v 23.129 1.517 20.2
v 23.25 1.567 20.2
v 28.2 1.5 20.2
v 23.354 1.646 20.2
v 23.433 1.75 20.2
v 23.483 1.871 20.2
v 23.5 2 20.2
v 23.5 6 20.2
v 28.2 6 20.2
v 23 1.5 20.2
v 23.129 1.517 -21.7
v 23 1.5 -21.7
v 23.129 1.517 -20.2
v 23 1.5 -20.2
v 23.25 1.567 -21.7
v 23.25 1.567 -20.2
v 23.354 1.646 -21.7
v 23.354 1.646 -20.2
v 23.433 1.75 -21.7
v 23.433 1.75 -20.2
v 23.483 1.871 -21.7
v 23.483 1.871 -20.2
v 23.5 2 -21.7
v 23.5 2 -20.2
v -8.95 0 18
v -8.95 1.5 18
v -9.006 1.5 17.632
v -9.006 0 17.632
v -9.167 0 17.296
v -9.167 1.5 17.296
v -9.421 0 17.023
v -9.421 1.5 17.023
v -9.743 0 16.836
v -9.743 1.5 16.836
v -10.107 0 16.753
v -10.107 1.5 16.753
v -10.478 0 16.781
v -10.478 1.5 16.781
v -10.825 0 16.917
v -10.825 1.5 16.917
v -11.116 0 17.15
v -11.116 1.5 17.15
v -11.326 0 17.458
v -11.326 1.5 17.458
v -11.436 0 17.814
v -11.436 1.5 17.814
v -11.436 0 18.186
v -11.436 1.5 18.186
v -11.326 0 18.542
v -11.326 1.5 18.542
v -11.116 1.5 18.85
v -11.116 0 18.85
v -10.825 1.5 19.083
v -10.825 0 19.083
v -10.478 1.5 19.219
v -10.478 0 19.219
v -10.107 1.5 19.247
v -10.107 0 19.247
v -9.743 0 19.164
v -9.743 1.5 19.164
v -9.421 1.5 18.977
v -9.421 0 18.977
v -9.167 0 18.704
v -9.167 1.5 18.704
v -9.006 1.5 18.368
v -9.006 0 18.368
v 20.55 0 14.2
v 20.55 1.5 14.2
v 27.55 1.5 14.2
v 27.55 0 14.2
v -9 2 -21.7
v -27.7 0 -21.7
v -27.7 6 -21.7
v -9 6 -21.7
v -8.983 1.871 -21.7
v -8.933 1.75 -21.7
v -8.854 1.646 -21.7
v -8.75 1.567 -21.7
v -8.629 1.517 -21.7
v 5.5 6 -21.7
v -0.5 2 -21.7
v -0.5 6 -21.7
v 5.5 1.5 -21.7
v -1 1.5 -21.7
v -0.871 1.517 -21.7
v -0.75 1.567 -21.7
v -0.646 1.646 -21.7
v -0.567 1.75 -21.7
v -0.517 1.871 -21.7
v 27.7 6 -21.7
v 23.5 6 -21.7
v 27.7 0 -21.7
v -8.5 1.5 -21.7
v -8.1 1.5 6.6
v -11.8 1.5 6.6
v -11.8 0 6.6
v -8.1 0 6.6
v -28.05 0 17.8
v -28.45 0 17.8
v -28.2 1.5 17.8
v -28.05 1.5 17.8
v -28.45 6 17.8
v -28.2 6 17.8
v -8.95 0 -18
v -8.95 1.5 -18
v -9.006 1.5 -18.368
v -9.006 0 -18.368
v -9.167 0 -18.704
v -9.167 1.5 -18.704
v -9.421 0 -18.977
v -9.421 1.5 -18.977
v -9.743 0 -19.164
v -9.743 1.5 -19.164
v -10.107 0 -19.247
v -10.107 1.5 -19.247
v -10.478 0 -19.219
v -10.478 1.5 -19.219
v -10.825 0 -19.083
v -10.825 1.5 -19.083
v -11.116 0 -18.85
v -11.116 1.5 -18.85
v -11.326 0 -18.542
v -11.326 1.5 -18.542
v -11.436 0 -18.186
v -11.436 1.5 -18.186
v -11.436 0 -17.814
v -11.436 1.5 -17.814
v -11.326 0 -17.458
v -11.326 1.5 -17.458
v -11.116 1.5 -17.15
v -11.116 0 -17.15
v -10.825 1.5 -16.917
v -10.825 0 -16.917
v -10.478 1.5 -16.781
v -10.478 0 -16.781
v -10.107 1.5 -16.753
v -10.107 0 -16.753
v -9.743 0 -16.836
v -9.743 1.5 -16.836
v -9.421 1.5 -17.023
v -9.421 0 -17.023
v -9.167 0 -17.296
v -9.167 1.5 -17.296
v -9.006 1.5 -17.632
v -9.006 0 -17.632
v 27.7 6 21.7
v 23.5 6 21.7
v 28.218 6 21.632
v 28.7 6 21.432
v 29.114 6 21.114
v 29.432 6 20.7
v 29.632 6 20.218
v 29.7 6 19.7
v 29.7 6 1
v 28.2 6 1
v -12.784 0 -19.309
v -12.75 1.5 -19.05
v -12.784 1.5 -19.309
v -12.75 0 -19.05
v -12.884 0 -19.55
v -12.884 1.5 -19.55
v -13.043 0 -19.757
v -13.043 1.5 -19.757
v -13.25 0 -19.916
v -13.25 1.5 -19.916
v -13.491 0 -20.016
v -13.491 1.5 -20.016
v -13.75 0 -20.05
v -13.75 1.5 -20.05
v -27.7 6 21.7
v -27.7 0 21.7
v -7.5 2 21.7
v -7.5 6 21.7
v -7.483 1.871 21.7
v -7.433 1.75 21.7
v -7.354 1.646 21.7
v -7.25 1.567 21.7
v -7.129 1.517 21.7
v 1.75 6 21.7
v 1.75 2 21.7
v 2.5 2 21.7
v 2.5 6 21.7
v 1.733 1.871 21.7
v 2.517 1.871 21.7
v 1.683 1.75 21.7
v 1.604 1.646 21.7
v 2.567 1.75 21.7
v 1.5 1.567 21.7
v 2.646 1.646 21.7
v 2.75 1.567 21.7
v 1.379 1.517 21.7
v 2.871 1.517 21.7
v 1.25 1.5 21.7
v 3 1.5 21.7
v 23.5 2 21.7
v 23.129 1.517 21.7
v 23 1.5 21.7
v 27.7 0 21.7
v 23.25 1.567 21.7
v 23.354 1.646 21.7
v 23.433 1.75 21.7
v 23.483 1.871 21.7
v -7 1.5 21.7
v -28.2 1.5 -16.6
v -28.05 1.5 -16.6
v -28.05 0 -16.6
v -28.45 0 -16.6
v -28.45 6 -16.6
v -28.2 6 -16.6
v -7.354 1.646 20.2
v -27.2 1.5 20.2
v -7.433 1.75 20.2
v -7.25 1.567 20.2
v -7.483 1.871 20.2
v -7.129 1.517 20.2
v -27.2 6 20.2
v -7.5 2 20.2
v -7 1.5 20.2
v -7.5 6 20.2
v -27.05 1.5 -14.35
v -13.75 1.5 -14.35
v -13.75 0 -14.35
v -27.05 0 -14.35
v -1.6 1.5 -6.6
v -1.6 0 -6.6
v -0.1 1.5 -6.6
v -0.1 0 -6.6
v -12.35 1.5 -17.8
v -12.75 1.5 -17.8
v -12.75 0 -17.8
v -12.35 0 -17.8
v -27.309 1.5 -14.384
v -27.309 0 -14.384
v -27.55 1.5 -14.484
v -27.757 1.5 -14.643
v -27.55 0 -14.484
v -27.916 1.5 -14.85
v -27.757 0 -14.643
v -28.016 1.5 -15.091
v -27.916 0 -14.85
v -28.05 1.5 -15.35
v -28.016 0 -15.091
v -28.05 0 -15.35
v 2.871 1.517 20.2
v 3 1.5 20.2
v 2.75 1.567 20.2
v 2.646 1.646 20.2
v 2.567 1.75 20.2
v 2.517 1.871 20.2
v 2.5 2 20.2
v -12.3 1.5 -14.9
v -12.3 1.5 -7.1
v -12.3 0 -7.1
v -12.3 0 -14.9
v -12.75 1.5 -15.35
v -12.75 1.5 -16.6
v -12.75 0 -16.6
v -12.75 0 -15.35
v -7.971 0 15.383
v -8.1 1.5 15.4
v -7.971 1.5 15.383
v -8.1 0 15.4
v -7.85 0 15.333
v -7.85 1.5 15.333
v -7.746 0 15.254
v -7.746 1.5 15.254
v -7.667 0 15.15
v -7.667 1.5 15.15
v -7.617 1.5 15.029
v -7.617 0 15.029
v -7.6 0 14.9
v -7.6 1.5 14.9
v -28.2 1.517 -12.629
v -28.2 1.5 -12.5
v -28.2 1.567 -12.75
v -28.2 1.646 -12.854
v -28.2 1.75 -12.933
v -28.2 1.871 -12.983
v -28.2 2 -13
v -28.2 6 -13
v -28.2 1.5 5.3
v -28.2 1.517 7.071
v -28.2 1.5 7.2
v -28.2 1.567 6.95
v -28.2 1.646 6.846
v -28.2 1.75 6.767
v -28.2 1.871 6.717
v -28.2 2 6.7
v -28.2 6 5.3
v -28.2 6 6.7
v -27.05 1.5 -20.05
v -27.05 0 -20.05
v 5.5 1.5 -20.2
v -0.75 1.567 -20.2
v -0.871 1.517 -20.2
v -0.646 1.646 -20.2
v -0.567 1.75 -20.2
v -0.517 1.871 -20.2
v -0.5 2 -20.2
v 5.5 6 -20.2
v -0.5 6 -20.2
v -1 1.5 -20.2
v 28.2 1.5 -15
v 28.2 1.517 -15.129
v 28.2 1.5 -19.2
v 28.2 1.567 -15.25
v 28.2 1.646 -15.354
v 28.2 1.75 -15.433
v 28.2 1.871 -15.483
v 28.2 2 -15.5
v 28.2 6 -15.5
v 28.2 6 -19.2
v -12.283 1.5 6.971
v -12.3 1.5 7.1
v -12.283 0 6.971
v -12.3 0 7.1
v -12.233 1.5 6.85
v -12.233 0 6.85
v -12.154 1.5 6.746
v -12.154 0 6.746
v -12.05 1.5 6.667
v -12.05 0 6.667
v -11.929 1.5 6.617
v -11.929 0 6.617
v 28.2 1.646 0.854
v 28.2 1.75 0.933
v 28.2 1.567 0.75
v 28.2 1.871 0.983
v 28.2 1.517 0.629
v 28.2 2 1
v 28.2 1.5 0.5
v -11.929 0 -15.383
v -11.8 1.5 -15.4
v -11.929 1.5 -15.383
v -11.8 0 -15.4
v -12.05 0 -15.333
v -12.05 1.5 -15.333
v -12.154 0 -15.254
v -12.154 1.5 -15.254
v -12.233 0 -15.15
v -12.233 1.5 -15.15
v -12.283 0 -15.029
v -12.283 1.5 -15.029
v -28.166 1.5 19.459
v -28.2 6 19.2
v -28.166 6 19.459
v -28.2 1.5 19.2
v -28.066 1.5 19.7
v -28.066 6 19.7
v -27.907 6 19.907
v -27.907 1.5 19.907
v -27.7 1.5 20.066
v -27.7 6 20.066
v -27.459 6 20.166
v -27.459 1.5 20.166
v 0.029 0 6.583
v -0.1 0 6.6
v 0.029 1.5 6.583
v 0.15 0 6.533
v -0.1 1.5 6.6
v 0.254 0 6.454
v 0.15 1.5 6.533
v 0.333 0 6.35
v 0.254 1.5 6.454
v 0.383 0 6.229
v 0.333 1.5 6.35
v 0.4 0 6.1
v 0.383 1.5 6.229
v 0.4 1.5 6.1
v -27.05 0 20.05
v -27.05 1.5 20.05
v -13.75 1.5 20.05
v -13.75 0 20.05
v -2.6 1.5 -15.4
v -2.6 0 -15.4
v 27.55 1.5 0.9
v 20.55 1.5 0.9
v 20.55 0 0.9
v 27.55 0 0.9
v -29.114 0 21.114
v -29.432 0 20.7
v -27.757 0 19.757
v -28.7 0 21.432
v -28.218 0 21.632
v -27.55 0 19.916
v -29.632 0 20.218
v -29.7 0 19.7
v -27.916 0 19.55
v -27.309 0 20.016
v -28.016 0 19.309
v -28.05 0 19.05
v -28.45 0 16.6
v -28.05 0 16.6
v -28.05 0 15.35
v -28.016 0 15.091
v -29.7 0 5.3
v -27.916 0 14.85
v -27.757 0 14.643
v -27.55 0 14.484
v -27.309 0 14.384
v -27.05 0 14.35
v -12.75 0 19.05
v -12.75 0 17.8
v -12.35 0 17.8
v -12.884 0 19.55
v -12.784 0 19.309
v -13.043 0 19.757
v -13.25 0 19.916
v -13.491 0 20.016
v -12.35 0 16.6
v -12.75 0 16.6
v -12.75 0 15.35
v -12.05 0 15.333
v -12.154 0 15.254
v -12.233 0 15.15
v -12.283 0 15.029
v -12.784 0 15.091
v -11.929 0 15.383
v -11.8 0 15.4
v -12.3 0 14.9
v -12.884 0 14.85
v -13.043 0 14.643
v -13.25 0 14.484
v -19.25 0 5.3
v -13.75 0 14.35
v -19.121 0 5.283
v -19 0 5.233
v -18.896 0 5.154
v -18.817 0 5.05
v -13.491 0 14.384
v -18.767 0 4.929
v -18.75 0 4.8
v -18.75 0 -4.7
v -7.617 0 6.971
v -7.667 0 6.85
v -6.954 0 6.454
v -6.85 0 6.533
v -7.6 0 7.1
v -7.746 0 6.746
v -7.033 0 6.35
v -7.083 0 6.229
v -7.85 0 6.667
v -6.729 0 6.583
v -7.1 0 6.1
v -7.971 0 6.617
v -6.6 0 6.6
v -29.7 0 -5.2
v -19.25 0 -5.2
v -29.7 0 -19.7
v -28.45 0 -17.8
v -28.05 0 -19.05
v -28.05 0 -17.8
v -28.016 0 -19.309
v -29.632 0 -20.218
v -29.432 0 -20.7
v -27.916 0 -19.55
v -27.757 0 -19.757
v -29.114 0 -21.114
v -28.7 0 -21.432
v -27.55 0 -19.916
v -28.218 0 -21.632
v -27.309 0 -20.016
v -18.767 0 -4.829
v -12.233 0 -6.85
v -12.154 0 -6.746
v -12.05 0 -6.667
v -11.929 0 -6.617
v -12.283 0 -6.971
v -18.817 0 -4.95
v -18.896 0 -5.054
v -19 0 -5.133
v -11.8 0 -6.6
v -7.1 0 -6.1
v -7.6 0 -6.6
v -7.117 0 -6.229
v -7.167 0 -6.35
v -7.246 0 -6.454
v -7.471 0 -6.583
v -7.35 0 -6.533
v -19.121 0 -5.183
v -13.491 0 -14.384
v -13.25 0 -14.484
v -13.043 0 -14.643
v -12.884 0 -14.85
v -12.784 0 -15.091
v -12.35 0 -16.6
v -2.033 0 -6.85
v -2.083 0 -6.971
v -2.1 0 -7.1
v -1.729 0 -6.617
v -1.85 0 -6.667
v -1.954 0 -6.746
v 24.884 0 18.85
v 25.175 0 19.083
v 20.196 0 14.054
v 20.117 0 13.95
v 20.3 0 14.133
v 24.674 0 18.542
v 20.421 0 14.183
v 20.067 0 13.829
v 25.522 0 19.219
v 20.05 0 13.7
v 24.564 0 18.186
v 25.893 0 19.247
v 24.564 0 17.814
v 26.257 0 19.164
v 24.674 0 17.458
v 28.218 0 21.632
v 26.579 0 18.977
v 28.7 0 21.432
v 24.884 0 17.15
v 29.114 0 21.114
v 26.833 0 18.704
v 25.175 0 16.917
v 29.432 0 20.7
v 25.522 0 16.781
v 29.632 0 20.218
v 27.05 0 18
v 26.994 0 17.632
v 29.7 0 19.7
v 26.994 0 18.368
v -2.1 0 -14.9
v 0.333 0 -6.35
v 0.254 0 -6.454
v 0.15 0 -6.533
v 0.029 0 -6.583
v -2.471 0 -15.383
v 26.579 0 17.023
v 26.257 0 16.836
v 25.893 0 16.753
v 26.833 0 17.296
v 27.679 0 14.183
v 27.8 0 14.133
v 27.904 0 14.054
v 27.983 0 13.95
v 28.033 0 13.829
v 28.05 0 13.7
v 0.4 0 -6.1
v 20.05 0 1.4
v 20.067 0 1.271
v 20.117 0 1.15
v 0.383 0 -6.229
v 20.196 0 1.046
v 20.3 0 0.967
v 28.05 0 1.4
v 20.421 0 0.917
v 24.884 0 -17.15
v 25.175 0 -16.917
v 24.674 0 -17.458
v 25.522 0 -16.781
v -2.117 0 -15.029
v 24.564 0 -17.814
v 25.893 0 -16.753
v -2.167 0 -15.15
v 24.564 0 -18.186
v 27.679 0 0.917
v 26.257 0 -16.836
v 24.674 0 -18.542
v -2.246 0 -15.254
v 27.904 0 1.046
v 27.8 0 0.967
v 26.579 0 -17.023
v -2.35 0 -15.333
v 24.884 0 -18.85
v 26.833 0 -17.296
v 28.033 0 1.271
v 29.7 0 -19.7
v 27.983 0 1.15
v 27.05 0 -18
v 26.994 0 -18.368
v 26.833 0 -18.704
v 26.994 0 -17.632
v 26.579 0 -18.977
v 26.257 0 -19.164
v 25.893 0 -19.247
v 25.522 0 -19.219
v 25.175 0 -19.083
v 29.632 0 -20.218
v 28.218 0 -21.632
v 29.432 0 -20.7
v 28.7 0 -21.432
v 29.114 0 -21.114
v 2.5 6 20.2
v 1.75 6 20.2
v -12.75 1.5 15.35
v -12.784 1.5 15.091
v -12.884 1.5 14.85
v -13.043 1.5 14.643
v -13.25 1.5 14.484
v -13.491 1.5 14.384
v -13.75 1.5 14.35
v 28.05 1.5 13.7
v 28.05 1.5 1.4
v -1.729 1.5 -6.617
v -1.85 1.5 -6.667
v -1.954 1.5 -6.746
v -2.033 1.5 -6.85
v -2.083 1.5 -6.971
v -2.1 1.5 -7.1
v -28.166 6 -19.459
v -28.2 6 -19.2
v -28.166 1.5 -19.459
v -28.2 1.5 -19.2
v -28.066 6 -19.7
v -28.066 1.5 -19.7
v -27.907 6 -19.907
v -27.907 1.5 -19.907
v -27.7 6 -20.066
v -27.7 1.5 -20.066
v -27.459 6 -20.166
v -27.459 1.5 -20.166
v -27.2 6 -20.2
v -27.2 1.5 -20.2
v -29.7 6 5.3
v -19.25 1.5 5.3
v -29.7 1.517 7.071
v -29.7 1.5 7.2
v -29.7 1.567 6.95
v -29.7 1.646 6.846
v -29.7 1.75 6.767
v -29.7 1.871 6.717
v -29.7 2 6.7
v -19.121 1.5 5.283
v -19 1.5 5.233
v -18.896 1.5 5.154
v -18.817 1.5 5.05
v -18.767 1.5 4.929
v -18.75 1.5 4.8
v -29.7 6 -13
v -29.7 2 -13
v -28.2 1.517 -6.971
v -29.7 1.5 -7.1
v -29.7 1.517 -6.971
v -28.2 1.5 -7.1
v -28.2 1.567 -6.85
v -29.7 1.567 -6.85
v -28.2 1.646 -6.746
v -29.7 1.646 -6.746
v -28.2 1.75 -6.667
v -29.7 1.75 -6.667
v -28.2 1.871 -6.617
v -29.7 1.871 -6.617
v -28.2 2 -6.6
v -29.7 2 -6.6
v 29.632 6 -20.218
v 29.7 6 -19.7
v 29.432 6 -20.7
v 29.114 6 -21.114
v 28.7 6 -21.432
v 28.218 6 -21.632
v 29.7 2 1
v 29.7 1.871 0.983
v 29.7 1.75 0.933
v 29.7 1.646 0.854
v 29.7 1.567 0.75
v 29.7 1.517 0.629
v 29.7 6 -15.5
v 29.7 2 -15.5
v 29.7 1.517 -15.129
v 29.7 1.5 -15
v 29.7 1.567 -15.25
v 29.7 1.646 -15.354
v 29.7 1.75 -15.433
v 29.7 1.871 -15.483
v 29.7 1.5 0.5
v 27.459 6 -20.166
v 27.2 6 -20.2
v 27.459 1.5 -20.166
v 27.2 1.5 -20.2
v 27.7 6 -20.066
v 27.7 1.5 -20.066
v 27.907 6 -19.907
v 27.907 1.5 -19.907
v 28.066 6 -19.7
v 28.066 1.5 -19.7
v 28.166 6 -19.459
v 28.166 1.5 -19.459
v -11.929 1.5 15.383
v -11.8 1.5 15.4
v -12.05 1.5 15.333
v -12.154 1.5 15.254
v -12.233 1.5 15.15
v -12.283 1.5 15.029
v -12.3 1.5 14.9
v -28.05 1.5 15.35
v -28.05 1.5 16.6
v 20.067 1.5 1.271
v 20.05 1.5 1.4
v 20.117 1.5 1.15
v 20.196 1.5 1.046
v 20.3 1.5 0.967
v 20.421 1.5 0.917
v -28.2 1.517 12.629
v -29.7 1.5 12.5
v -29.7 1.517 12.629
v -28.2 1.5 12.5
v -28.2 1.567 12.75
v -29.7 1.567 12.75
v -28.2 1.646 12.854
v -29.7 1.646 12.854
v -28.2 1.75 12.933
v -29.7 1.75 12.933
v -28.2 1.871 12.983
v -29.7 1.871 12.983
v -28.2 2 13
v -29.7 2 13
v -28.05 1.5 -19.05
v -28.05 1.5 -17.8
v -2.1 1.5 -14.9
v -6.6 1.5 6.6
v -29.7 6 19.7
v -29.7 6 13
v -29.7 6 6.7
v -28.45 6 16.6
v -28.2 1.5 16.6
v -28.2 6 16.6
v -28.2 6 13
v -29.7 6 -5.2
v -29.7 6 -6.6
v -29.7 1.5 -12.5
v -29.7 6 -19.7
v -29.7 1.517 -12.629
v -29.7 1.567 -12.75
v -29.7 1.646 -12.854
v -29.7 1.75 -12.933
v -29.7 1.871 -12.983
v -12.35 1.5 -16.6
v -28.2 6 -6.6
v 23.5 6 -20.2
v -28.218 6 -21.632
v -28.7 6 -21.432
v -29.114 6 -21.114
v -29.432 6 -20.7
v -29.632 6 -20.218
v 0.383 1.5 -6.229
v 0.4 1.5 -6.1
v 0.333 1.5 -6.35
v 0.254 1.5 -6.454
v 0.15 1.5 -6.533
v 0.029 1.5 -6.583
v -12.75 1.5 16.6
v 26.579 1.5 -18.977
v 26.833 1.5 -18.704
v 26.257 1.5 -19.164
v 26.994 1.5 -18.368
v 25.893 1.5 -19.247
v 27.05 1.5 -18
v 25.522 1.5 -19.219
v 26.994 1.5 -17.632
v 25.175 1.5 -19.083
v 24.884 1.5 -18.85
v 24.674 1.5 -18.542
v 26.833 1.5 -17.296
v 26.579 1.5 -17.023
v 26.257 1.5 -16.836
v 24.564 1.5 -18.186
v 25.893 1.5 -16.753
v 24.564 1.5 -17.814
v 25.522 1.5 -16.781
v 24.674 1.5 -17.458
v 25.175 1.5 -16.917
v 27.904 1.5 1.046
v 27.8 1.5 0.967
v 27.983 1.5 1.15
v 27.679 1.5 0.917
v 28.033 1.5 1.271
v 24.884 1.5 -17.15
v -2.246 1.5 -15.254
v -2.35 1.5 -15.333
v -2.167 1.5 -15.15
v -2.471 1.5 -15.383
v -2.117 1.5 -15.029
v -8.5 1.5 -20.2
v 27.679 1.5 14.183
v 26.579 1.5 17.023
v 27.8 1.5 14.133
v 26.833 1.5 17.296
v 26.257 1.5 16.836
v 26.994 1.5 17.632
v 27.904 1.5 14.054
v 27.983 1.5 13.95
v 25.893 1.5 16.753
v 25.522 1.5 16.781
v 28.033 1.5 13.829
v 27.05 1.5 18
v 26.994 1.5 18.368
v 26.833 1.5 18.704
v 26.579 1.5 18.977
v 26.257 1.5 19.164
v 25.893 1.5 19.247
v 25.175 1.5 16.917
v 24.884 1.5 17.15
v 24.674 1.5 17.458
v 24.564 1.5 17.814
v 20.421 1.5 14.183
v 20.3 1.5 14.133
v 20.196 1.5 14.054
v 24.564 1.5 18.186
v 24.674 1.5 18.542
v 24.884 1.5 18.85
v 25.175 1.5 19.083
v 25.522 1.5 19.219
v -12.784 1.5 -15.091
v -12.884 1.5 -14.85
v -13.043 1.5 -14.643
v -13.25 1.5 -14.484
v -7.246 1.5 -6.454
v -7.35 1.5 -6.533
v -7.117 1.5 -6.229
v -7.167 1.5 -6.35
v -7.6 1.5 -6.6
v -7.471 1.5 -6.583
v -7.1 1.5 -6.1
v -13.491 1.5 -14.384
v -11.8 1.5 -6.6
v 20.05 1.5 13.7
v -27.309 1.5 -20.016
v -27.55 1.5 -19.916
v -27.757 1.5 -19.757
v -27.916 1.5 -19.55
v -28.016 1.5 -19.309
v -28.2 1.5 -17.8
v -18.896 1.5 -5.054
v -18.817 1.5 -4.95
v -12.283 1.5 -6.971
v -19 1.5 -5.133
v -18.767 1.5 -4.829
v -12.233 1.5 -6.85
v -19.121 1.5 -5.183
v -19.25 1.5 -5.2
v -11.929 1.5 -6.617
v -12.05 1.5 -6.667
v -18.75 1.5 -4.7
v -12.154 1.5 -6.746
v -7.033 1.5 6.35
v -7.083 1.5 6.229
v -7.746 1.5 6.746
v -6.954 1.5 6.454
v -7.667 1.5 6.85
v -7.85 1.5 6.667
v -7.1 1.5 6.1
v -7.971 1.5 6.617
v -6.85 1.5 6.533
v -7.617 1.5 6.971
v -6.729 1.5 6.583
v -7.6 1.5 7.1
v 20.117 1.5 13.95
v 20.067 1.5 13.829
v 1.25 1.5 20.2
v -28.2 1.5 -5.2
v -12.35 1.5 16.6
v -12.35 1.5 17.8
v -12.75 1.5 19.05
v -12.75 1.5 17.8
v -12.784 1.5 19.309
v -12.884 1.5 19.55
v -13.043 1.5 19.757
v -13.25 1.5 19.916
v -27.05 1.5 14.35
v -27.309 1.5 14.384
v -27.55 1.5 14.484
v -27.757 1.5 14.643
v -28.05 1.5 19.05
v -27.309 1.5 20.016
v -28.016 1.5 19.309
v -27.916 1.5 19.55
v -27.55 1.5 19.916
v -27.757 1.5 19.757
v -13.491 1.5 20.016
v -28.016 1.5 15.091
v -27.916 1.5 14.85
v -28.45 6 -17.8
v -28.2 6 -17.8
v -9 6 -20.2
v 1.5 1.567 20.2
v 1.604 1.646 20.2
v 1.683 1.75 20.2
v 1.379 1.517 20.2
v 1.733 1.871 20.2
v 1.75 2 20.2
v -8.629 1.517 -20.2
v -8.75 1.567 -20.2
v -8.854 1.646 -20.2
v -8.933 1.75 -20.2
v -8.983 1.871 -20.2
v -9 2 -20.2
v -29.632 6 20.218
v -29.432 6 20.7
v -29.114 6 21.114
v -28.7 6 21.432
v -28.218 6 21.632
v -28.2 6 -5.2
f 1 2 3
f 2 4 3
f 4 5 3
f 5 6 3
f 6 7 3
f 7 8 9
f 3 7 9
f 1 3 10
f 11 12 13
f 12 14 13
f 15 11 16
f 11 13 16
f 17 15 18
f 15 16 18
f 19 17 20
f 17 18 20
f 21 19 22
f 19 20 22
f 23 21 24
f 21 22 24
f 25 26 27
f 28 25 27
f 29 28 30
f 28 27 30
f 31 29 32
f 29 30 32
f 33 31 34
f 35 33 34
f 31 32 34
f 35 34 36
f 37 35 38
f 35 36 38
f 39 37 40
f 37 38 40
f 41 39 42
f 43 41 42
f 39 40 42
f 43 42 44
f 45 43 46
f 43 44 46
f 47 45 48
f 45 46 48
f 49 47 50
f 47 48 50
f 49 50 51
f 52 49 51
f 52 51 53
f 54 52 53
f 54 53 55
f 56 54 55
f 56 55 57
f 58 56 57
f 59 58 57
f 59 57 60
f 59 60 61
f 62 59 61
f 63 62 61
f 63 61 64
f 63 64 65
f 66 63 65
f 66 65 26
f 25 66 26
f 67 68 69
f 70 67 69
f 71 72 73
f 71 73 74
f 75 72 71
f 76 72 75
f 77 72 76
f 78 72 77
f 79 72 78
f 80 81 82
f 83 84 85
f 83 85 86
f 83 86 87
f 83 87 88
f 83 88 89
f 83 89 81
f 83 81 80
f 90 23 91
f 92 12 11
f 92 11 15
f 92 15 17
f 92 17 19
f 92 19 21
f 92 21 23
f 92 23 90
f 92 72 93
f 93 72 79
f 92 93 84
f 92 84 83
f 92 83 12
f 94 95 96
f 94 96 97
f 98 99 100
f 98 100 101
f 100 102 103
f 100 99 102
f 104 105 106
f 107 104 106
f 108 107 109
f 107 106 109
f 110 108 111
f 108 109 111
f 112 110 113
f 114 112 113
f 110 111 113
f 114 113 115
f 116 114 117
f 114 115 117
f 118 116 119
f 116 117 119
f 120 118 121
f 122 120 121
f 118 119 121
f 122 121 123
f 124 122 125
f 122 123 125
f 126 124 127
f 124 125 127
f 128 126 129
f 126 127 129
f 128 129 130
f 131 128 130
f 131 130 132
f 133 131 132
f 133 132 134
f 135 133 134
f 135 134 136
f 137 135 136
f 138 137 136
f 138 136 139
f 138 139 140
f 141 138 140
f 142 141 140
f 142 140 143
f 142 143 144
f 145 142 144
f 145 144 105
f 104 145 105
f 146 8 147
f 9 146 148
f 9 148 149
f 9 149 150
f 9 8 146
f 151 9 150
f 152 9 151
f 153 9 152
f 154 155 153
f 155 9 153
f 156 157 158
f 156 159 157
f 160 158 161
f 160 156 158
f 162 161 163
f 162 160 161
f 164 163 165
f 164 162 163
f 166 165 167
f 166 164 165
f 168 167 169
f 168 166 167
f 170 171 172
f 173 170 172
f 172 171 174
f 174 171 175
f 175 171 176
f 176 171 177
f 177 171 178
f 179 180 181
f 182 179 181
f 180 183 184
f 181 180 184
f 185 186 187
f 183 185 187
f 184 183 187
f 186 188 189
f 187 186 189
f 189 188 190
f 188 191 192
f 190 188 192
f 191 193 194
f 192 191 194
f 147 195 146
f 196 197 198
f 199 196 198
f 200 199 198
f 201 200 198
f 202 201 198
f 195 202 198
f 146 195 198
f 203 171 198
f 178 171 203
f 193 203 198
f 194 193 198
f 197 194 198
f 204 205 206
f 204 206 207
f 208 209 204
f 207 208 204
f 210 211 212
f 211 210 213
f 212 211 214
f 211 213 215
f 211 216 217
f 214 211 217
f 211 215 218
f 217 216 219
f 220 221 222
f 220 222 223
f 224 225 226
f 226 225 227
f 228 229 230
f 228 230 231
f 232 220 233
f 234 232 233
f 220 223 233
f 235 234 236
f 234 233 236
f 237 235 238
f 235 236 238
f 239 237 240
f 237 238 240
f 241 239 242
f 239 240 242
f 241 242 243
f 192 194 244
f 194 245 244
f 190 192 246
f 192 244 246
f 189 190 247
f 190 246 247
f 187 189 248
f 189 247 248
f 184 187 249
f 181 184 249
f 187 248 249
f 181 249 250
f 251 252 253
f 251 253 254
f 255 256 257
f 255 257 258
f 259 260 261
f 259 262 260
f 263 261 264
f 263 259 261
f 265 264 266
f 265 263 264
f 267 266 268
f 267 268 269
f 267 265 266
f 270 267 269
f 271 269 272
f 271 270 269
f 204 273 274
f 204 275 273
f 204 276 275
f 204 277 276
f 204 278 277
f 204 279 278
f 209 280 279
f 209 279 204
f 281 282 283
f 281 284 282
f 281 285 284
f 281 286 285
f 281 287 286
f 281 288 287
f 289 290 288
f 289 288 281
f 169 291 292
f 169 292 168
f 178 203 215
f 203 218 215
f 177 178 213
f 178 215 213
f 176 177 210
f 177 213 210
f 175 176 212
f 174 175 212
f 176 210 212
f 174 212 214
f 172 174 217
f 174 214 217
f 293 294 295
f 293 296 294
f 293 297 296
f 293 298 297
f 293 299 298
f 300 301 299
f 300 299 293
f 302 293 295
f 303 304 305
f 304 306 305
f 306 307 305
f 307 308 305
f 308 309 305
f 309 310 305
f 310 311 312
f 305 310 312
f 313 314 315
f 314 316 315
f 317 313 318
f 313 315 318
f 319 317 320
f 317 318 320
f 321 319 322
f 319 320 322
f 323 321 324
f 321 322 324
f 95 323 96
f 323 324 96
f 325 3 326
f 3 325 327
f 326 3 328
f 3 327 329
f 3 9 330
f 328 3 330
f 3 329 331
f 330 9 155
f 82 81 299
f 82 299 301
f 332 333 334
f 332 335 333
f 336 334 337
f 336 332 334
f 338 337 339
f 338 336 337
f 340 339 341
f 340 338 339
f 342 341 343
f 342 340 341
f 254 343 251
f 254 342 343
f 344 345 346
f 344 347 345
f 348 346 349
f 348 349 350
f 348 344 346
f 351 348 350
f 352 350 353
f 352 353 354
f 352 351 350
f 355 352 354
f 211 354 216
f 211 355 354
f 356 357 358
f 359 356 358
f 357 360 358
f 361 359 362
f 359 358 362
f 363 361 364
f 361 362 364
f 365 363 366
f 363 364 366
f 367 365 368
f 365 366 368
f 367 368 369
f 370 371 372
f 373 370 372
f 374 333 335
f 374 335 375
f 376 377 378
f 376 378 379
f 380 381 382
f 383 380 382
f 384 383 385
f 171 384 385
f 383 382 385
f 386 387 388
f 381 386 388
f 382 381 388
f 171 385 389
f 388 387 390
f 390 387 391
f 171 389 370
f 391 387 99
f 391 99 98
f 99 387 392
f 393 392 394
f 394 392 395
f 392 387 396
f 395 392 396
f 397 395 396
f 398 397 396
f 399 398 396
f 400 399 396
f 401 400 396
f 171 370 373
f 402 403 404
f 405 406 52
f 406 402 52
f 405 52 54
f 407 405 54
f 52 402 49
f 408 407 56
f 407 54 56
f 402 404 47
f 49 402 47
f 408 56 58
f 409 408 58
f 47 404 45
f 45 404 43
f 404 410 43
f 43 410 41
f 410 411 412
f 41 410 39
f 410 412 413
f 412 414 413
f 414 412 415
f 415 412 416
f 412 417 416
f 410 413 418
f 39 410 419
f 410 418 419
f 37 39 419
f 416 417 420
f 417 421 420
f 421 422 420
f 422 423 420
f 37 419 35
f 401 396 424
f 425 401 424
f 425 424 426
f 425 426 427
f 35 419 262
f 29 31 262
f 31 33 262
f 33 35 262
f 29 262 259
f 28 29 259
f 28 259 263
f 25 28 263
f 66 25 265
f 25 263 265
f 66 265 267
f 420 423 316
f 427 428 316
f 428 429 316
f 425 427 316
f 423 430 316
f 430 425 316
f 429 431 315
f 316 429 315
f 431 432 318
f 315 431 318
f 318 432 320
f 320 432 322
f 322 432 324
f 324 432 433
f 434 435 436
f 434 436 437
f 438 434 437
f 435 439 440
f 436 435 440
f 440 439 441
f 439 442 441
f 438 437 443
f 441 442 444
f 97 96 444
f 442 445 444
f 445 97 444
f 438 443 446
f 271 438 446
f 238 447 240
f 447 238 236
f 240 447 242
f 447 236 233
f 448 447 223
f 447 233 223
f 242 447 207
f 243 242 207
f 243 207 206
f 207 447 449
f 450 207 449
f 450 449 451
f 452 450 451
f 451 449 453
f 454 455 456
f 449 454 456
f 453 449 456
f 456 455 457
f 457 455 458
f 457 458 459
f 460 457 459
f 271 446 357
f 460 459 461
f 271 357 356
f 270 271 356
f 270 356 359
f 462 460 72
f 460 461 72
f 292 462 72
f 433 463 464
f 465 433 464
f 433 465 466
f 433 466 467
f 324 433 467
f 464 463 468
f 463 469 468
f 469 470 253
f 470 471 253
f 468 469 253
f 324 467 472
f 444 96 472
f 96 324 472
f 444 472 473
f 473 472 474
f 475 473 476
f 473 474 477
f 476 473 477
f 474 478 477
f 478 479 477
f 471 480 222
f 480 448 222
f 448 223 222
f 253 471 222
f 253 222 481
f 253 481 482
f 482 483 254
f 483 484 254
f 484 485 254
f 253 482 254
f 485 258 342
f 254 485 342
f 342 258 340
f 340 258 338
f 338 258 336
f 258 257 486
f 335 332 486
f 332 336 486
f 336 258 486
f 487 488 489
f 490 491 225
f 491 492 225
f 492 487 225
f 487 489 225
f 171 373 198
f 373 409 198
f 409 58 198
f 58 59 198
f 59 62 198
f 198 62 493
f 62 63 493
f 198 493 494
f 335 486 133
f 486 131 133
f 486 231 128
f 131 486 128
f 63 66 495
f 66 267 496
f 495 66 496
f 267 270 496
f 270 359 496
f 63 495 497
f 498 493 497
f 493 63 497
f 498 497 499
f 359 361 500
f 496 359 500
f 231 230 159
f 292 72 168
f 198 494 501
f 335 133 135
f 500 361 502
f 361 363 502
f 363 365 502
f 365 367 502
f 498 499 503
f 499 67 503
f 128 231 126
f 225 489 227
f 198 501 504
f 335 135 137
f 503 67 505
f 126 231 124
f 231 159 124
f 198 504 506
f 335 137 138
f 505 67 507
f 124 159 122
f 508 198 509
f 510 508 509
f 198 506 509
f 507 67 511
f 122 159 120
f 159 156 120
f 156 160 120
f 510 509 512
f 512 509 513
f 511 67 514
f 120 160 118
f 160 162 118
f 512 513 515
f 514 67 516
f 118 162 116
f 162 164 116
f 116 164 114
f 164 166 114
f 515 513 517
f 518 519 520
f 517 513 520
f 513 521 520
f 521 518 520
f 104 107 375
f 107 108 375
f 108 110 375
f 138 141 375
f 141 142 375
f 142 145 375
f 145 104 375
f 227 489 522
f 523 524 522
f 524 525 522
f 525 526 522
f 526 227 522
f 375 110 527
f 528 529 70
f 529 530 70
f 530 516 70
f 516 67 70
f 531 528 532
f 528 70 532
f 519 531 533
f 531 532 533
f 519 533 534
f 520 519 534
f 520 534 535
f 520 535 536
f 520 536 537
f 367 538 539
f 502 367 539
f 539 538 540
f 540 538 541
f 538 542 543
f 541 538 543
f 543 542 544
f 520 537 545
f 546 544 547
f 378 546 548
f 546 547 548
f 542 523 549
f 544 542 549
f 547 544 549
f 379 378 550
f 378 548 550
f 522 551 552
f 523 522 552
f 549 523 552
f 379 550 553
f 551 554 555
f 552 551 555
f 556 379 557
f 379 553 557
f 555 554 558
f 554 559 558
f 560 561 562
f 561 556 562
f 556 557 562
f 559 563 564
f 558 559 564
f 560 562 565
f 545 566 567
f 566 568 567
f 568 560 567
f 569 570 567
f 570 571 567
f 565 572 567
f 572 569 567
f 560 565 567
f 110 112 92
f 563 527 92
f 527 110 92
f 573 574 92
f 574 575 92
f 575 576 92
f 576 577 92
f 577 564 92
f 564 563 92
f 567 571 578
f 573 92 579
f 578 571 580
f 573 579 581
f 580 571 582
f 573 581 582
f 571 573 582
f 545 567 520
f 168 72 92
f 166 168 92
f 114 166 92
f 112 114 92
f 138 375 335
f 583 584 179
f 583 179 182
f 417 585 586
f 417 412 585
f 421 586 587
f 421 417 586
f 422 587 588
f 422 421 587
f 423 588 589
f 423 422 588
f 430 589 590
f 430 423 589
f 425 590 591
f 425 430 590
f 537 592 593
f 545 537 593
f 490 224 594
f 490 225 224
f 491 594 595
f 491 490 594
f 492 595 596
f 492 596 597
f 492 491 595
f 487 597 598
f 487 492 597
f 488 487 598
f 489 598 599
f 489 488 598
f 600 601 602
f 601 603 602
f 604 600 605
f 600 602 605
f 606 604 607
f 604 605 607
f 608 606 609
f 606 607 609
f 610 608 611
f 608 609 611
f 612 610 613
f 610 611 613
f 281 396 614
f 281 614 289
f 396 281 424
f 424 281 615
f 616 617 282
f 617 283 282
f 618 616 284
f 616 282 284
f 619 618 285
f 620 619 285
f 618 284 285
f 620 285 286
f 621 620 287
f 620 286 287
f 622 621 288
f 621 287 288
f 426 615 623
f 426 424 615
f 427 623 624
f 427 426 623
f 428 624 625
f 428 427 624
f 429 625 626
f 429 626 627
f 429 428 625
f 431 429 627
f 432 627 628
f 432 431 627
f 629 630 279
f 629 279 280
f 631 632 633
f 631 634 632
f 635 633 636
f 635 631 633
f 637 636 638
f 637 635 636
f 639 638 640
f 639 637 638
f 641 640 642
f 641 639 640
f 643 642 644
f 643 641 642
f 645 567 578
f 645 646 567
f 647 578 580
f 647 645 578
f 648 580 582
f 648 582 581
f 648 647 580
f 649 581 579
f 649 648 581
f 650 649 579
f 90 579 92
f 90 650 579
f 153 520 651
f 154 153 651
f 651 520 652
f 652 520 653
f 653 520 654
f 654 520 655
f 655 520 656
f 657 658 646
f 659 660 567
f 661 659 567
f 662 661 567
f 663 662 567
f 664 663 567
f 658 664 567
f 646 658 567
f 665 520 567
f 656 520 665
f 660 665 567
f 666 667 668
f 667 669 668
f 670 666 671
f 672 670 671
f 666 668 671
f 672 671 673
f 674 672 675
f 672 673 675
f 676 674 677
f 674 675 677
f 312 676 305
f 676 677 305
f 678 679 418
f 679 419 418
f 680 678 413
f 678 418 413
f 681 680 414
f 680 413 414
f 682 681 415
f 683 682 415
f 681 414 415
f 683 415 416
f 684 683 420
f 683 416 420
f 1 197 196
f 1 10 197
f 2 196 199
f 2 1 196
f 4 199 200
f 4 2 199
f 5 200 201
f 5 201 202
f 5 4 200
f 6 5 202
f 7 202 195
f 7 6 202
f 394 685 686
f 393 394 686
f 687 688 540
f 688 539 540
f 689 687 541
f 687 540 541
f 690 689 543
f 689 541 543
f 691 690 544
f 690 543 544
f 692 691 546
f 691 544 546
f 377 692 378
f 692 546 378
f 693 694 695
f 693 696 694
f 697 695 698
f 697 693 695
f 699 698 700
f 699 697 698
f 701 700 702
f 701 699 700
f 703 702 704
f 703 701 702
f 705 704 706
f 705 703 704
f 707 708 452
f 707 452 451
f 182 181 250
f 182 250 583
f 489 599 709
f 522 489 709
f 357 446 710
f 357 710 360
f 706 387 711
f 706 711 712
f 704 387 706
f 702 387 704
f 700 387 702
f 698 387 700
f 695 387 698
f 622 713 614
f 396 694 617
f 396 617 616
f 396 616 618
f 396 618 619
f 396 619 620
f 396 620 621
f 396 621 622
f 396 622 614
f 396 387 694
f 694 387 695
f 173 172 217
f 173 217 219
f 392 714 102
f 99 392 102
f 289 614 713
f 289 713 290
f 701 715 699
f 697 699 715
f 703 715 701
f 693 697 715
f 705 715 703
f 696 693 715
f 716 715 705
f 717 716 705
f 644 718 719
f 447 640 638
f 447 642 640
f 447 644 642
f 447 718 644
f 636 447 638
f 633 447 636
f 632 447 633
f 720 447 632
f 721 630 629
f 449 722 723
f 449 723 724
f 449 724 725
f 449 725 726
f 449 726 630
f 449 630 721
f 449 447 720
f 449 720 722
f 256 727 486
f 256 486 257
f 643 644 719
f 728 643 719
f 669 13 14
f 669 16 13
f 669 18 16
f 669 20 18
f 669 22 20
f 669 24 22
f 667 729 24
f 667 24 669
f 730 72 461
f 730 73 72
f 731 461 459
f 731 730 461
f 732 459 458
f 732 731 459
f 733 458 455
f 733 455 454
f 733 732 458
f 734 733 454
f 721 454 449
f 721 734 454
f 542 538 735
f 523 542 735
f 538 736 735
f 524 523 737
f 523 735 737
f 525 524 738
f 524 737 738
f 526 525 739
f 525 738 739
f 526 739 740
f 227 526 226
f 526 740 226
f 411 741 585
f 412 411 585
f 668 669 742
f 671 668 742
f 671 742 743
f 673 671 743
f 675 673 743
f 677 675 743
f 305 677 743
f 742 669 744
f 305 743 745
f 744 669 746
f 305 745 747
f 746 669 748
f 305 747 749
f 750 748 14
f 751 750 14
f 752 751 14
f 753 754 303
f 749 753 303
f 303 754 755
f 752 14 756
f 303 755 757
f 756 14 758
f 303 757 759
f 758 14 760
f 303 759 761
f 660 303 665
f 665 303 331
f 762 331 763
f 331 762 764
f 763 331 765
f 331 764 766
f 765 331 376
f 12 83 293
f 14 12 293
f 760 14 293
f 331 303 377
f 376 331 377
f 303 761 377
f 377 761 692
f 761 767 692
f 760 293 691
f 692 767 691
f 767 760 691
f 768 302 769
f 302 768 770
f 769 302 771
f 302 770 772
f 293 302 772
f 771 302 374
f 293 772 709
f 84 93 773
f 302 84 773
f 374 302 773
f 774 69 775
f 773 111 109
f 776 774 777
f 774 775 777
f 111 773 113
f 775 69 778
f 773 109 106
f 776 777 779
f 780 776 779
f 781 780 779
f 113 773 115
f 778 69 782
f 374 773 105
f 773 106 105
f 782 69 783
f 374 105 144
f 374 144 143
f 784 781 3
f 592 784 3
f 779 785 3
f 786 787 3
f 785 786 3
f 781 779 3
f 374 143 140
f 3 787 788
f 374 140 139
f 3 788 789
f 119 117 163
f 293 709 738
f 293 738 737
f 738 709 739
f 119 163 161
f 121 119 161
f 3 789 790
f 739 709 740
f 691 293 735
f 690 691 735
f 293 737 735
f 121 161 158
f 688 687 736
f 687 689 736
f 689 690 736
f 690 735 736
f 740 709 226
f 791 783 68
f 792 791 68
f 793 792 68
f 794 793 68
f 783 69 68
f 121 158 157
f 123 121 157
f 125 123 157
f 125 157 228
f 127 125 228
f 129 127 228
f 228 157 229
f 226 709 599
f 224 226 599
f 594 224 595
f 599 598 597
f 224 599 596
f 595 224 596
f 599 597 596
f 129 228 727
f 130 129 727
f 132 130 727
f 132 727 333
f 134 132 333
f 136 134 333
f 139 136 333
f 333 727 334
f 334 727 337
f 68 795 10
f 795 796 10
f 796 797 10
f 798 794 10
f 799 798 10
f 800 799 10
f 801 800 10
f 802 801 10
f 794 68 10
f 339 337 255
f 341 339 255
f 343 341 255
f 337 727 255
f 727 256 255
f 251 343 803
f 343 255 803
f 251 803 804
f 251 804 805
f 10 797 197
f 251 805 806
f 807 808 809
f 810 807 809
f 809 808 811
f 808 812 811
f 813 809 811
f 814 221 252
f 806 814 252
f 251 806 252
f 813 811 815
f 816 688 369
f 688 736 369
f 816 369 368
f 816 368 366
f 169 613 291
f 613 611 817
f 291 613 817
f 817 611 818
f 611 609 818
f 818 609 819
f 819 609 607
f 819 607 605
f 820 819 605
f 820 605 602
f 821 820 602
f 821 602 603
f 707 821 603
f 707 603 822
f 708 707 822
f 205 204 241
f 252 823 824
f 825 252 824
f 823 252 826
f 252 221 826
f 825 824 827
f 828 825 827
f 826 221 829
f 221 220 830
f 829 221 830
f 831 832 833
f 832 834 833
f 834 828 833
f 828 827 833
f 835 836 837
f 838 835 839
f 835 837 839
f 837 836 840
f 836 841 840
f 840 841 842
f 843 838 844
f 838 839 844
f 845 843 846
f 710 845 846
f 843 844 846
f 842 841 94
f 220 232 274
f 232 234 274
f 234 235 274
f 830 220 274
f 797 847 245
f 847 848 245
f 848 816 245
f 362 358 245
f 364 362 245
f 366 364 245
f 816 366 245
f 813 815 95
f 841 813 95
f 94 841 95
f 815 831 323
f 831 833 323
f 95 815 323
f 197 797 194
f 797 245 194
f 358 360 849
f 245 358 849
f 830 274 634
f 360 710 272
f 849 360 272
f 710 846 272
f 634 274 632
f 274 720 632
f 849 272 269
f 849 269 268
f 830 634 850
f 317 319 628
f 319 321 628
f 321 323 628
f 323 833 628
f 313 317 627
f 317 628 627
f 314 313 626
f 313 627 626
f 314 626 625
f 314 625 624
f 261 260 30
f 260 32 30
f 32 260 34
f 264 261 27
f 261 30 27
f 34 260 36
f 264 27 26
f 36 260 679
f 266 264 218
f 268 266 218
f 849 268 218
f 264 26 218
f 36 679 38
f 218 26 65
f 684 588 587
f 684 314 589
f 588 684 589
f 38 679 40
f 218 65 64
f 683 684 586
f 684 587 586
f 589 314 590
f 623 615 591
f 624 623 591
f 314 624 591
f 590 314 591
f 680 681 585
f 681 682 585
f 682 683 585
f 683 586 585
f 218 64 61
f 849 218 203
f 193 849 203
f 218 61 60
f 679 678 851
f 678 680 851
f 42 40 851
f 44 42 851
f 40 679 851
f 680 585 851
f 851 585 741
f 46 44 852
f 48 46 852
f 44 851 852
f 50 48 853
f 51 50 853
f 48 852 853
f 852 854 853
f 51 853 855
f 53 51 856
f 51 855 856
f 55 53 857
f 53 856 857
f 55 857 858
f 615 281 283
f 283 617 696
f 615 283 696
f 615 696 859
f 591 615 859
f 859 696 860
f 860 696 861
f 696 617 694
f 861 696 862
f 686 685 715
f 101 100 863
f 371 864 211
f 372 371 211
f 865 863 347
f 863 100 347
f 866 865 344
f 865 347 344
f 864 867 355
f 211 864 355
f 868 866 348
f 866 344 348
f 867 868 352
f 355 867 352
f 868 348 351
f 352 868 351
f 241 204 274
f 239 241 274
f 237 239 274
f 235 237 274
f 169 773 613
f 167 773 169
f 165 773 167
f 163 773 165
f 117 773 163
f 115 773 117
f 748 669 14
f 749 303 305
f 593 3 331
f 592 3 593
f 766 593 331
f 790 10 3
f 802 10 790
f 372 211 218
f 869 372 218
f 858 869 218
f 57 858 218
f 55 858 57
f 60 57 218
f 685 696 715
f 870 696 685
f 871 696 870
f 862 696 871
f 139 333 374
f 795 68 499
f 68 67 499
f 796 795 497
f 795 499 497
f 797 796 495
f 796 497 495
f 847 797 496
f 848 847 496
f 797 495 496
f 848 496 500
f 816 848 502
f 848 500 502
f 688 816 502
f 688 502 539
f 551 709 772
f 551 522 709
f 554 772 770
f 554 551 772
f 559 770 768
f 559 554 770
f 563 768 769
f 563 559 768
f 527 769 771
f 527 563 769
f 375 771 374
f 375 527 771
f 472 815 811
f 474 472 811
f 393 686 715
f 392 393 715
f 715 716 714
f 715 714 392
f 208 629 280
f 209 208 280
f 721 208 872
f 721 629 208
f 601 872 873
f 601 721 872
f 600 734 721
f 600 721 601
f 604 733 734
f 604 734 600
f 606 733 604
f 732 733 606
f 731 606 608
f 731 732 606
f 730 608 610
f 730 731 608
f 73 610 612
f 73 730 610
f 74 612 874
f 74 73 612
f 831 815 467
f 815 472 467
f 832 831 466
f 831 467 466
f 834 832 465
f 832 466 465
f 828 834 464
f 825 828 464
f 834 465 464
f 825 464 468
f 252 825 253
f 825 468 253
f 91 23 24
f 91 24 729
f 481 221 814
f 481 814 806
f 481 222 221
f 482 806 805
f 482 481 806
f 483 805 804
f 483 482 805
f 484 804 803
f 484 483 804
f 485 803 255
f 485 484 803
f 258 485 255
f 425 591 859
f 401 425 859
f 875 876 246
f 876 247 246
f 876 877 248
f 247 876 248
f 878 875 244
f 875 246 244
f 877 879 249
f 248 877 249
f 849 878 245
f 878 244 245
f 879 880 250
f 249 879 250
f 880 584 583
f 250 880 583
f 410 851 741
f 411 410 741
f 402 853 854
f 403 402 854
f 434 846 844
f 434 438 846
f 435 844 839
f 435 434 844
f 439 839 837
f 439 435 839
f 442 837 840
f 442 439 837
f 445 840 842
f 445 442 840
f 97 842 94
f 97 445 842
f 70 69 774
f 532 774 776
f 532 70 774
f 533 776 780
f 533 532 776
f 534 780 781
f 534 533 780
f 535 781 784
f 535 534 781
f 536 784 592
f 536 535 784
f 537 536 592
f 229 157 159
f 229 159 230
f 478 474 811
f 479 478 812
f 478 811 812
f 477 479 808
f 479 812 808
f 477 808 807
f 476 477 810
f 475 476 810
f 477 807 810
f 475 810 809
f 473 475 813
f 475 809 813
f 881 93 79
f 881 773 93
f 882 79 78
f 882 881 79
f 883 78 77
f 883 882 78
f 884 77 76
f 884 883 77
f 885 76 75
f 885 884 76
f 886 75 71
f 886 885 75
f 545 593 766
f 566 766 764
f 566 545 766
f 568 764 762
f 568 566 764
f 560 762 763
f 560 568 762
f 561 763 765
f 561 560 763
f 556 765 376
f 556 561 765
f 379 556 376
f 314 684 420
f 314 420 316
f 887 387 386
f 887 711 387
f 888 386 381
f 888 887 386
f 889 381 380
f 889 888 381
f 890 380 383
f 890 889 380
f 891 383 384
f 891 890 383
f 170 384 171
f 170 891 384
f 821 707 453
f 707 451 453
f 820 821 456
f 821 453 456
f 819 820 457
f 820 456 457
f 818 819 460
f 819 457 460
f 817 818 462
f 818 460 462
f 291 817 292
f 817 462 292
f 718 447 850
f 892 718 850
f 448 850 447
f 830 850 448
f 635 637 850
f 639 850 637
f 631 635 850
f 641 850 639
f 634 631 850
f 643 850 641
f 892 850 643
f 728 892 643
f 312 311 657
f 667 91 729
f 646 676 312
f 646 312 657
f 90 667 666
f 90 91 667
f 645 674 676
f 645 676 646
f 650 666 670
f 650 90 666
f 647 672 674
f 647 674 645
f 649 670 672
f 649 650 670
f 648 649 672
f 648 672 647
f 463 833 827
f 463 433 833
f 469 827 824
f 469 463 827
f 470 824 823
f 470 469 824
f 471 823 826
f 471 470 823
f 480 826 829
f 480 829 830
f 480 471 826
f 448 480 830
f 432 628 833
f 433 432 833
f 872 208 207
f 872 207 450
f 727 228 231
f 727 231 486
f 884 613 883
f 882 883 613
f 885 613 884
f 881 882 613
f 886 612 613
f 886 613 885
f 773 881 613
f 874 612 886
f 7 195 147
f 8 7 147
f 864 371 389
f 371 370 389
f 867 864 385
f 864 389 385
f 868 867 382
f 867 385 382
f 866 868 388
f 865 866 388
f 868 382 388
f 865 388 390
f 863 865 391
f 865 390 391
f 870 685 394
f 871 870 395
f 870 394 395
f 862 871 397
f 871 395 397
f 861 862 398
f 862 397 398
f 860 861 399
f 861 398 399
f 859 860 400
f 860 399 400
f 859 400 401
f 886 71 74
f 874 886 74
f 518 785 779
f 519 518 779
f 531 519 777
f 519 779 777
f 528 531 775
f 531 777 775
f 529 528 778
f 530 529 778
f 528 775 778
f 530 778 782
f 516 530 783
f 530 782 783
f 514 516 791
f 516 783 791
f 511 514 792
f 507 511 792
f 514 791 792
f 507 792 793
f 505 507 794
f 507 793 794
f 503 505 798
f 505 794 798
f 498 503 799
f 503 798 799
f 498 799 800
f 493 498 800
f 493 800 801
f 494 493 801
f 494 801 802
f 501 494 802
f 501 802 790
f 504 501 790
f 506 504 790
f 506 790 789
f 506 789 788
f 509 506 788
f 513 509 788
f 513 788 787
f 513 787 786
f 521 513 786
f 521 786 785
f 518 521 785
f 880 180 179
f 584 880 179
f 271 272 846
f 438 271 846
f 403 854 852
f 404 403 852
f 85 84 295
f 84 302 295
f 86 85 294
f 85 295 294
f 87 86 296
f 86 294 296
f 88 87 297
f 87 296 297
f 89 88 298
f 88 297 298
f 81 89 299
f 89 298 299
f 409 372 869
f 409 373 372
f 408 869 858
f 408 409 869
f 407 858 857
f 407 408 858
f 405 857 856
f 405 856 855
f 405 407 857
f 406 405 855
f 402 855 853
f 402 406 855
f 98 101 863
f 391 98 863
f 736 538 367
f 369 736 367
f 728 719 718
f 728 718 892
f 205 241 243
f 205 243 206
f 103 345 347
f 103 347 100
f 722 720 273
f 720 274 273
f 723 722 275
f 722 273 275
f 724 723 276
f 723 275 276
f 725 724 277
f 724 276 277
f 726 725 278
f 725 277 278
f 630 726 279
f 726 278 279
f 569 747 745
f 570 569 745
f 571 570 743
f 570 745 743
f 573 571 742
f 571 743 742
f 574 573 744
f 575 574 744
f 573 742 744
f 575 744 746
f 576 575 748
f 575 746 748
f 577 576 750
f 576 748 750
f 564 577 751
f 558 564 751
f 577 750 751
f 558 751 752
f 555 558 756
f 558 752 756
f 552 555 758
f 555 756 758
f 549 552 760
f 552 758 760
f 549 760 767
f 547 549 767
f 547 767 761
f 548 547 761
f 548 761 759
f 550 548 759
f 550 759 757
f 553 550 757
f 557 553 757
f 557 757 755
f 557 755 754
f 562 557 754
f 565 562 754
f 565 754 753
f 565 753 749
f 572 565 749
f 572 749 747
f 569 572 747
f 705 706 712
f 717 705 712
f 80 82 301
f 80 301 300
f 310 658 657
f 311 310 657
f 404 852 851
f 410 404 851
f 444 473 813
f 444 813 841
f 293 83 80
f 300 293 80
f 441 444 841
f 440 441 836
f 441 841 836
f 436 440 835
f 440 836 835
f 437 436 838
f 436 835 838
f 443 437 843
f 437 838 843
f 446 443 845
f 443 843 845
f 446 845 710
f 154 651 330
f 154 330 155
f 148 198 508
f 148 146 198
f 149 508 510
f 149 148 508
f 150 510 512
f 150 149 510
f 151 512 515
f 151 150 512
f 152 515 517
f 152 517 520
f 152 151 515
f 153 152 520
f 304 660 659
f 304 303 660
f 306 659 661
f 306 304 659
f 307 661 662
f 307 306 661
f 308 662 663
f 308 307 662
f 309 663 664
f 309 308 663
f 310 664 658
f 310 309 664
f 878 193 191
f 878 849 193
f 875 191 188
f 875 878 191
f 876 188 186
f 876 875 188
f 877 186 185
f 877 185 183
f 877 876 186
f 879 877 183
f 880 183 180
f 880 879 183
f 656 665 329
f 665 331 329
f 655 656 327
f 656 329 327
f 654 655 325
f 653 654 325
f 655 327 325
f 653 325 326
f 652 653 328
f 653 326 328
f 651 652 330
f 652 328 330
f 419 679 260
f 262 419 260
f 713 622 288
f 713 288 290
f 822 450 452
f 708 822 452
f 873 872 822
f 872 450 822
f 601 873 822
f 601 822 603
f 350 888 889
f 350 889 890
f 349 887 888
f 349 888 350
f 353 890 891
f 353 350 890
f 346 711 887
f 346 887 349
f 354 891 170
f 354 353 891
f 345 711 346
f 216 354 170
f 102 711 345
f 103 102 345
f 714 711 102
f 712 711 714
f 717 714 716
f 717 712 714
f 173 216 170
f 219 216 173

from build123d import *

# Parameters (mm, degrees)
SKETCH_1_W               = 59.4
SKETCH_1_H               = 43.4
EXTRUDE_1_DEPTH          = 6
SKETCH_2_W               = 56.4
SKETCH_2_H               = 40.4
CUT_EXTRUDE_1_DEPTH      = 4.5
SKETCH_3_R               = 1.25
CUT_EXTRUDE_2_DEPTH      = 2.5
SKETCH_4_W               = 10.95
SKETCH_4_H               = 10.5
CUT_EXTRUDE_3_DEPTH      = 5.5
CUT_EXTRUDE_3_DEPTH_BACK = 2.5
SKETCH_5_W               = 6.4
SKETCH_5_H               = 4.5
SKETCH_5_W_2             = 6.3
CUT_EXTRUDE_4_DEPTH      = 4.5
CUT_EXTRUDE_5_DEPTH      = 5.5
CUT_EXTRUDE_5_DEPTH_BACK = 2.5
SKETCH_9_W               = 10.2
SKETCH_9_H               = 8.8
SKETCH_9_W_2             = 4.7
CUT_EXTRUDE_6_DEPTH      = 5.5
CUT_EXTRUDE_6_DEPTH_BACK = 2.5
SKETCH_10_W              = 8
SKETCH_10_H              = 13.3
CUT_EXTRUDE_7_DEPTH      = 5.5
CUT_EXTRUDE_7_DEPTH_BACK = 2.5
FILLET_1_R               = 2
SKETCH_11_W              = 8.5
SKETCH_11_H              = 4.5
SKETCH_11_W_2            = 18
CUT_EXTRUDE_8_DEPTH      = 3
SKETCH_12_W              = 9.25
SKETCH_12_H              = 4.5
SKETCH_12_W_2            = 21
CUT_EXTRUDE_9_DEPTH      = 3
SKETCH_13_W              = 16.5
SKETCH_13_H              = 4.5
CUT_EXTRUDE_10_DEPTH     = 3
SKETCH_14_W              = 7.5
SKETCH_14_H              = 13.2
CUT_EXTRUDE_11_DEPTH     = 10
FILLET_2_R               = 0.5
FILLET_3_R               = 1
FILLET_4_R               = 0.5


with BuildPart() as part:
    # 草图1 → 凸台-拉伸1 (new body)
    with BuildSketch(Plane(origin=(0, 0, 0), x_dir=(1, 0, 0), z_dir=(0, 1, 0))):
        Rectangle(SKETCH_1_W, SKETCH_1_H)
    extrude(amount=EXTRUDE_1_DEPTH)

    # 草图2 → 切除-拉伸1 (cut)
    with BuildSketch(Plane(origin=(0, 6, 0), x_dir=(1, 0, 0), z_dir=(0, 1, 0))):
        Rectangle(SKETCH_2_W, SKETCH_2_H)
    extrude(amount=-CUT_EXTRUDE_1_DEPTH, mode=Mode.SUBTRACT)

    # 草图3 → 切除-拉伸2 (cut, through all)
    with BuildSketch(Plane(origin=(0, 1.5, 0), x_dir=(1, 0, 0), z_dir=(0, 1, 0))):
        with Locations((-10.2, -18)):
            Circle(SKETCH_3_R)
        with Locations((-10.2, 18)):
            Circle(SKETCH_3_R)
        with Locations((25.8, 18)):
            Circle(SKETCH_3_R)
        with Locations((25.8, -18)):
            Circle(SKETCH_3_R)
    extrude(amount=-CUT_EXTRUDE_2_DEPTH, mode=Mode.SUBTRACT)

    # 草图4 → 切除-拉伸3 (cut, two sides)
    with BuildSketch(Plane(origin=(0, 1.5, 0), x_dir=(1, 0, 0), z_dir=(0, 1, 0))) as cut_extrude_3_sk:
        with Locations((-24.225, -0.05)):
            Rectangle(SKETCH_4_W, SKETCH_4_H)
    extrude(amount=CUT_EXTRUDE_3_DEPTH, mode=Mode.SUBTRACT)
    extrude(cut_extrude_3_sk.sketch, amount=-CUT_EXTRUDE_3_DEPTH_BACK, mode=Mode.SUBTRACT)

    # 草图5 → 切除-拉伸4 (cut)
    with BuildSketch(Plane.ZY.offset(29.7)):
        with Locations((-9.8, 3.75)):
            Rectangle(SKETCH_5_W, SKETCH_5_H)
        with Locations((9.85, 3.75)):
            Rectangle(SKETCH_5_W_2, SKETCH_5_H)
    extrude(amount=-CUT_EXTRUDE_4_DEPTH, mode=Mode.SUBTRACT)

    # 草图8 → 切除-拉伸5 (cut, two sides)
    with BuildSketch(Plane(origin=(0, 1.5, 0), x_dir=(1, 0, 0), z_dir=(0, 1, 0))) as cut_extrude_5_sk:
        Polygon((-28.05, 14.35), (-28.05, 16.6), (-28.45, 16.6), (-28.45, 17.8), (-28.05, 17.8), (-28.05, 20.05), (-12.75, 20.05), (-12.75, 17.8), (-12.35, 17.8), (-12.35, 16.6), (-12.75, 16.6), (-12.75, 14.35), align=None)
        Polygon((-28.05, -20.05), (-12.75, -20.05), (-12.75, -17.8), (-12.35, -17.8), (-12.35, -16.6), (-12.75, -16.6), (-12.75, -14.35), (-28.05, -14.35), (-28.05, -16.6), (-28.45, -16.6), (-28.45, -17.8), (-28.05, -17.8), align=None)
    extrude(amount=CUT_EXTRUDE_5_DEPTH, mode=Mode.SUBTRACT)
    extrude(cut_extrude_5_sk.sketch, amount=-CUT_EXTRUDE_5_DEPTH_BACK, mode=Mode.SUBTRACT)

    # 草图9 → 切除-拉伸6 (cut, two sides)
    with BuildSketch(Plane(origin=(0, 1.5, 0), x_dir=(1, 0, 0), z_dir=(0, 1, 0))) as cut_extrude_6_sk:
        with Locations((-7.2, 11)):
            Rectangle(SKETCH_9_W, SKETCH_9_H)
        with Locations((-9.95, -11)):
            Rectangle(SKETCH_9_W_2, SKETCH_9_H)
    extrude(amount=CUT_EXTRUDE_6_DEPTH, mode=Mode.SUBTRACT)
    extrude(cut_extrude_6_sk.sketch, amount=-CUT_EXTRUDE_6_DEPTH_BACK, mode=Mode.SUBTRACT)

    # 草图10 → 切除-拉伸7 (cut, two sides)
    with BuildSketch(Plane(origin=(0, 1.5, 0), x_dir=(1, 0, 0), z_dir=(0, 1, 0))) as cut_extrude_7_sk:
        with Locations((24.05, -7.55)):
            Rectangle(SKETCH_10_W, SKETCH_10_H)
    extrude(amount=CUT_EXTRUDE_7_DEPTH, mode=Mode.SUBTRACT)
    extrude(cut_extrude_7_sk.sketch, amount=-CUT_EXTRUDE_7_DEPTH_BACK, mode=Mode.SUBTRACT)

    # 圆角1
    fillet_1_edges = [part.edges().sort_by_distance(p)[0] for p in [
        (29.7, 3, 21.7),
        (-29.7, 3, 21.7),
        (-29.7, 3, -21.7),
        (29.7, 3, -21.7),
    ]]
    fillet(fillet_1_edges, radius=FILLET_1_R)

    # 草图11 → 切除-拉伸8 (cut)
    with BuildSketch(Plane(origin=(0, 0, -21.7), x_dir=(-1, 0, 0), z_dir=(0, 0, -1))):
        with Locations((4.75, 3.75)):
            Rectangle(SKETCH_11_W, SKETCH_11_H)
        with Locations((-14.5, 3.75)):
            Rectangle(SKETCH_11_W_2, SKETCH_11_H)
    extrude(amount=-CUT_EXTRUDE_8_DEPTH, mode=Mode.SUBTRACT)

    # 草图12 → 切除-拉伸9 (cut)
    with BuildSketch(Plane.XY.offset(21.7)):
        with Locations((-2.875, 3.75)):
            Rectangle(SKETCH_12_W, SKETCH_12_H)
        with Locations((13, 3.75)):
            Rectangle(SKETCH_12_W_2, SKETCH_12_H)
    extrude(amount=-CUT_EXTRUDE_9_DEPTH, mode=Mode.SUBTRACT)

    # 草图13 → 切除-拉伸10 (cut)
    with BuildSketch(Plane(origin=(29.7, 0, 0), x_dir=(0, 0, -1), z_dir=(1, 0, 0))):
        with Locations((7.25, 3.75)):
            Rectangle(SKETCH_13_W, SKETCH_13_H)
    extrude(amount=-CUT_EXTRUDE_10_DEPTH, mode=Mode.SUBTRACT)

    # 草图14 → 切除-拉伸11 (cut)
    with BuildSketch(Plane.XZ):
        with Locations((-3.35, 0)):
            Rectangle(SKETCH_14_W, SKETCH_14_H)
    extrude(amount=-CUT_EXTRUDE_11_DEPTH, mode=Mode.SUBTRACT)

    # 圆角2
    fillet_2_edges = [part.edges().sort_by_distance(p)[0] for p in [
        (-12.3, 0.75, -15.4),
        (-2.1, 0.75, -15.4),
        (-2.1, 0.75, -6.6),
        (-12.3, 0.75, -6.6),
        (-12.3, 0.75, 15.4),
        (-12.3, 0.75, 6.6),
        (-7.6, 0.75, 6.6),
        (-7.6, 0.75, 15.4),
        (28.05, 0.75, 0.9),
        (28.05, 0.75, 14.2),
        (20.05, 0.75, 14.2),
        (20.05, 0.75, 0.9),
        (-7.1, 0.75, -6.6),
        (0.4, 0.75, -6.6),
        (0.4, 0.75, 6.6),
        (-7.1, 0.75, 6.6),
        (-18.75, 0.75, 5.3),
        (-18.75, 0.75, -5.2),
    ]]
    fillet(fillet_2_edges, radius=FILLET_2_R)

    # 圆角3
    fillet_3_edges = [part.edges().sort_by_distance(p)[0] for p in [
        (-28.05, 0.75, 14.35),
        (-12.75, 0.75, 14.35),
        (-12.75, 0.75, 20.05),
        (-28.05, 0.75, 20.05),
        (28.2, 3.75, -20.2),
        (-12.75, 0.75, -20.05),
        (-12.75, 0.75, -14.35),
        (-28.05, 0.75, -14.35),
        (-28.05, 0.75, -20.05),
        (-28.2, 3.75, 20.2),
        (-28.2, 3.75, -20.2),
    ]]
    fillet(fillet_3_edges, radius=FILLET_3_R)

    # 圆角4
    fillet_4_edges = [part.edges().sort_by_distance(p)[0] for p in [
        (23.5, 1.5, -20.95),
        (-9, 1.5, -20.95),
        (-0.5, 1.5, -20.95),
        (23.5, 1.5, 20.95),
        (2.5, 1.5, 20.95),
        (1.75, 1.5, 20.95),
        (-7.5, 1.5, 20.95),
        (28.95, 1.5, 1),
        (28.95, 1.5, -15.5),
        (-28.95, 1.5, -6.6),
        (-28.95, 1.5, -13),
        (-28.95, 1.5, 13),
        (-28.95, 1.5, 6.7),
    ]]
    fillet(fillet_4_edges, radius=FILLET_4_R)


solid = part.part
